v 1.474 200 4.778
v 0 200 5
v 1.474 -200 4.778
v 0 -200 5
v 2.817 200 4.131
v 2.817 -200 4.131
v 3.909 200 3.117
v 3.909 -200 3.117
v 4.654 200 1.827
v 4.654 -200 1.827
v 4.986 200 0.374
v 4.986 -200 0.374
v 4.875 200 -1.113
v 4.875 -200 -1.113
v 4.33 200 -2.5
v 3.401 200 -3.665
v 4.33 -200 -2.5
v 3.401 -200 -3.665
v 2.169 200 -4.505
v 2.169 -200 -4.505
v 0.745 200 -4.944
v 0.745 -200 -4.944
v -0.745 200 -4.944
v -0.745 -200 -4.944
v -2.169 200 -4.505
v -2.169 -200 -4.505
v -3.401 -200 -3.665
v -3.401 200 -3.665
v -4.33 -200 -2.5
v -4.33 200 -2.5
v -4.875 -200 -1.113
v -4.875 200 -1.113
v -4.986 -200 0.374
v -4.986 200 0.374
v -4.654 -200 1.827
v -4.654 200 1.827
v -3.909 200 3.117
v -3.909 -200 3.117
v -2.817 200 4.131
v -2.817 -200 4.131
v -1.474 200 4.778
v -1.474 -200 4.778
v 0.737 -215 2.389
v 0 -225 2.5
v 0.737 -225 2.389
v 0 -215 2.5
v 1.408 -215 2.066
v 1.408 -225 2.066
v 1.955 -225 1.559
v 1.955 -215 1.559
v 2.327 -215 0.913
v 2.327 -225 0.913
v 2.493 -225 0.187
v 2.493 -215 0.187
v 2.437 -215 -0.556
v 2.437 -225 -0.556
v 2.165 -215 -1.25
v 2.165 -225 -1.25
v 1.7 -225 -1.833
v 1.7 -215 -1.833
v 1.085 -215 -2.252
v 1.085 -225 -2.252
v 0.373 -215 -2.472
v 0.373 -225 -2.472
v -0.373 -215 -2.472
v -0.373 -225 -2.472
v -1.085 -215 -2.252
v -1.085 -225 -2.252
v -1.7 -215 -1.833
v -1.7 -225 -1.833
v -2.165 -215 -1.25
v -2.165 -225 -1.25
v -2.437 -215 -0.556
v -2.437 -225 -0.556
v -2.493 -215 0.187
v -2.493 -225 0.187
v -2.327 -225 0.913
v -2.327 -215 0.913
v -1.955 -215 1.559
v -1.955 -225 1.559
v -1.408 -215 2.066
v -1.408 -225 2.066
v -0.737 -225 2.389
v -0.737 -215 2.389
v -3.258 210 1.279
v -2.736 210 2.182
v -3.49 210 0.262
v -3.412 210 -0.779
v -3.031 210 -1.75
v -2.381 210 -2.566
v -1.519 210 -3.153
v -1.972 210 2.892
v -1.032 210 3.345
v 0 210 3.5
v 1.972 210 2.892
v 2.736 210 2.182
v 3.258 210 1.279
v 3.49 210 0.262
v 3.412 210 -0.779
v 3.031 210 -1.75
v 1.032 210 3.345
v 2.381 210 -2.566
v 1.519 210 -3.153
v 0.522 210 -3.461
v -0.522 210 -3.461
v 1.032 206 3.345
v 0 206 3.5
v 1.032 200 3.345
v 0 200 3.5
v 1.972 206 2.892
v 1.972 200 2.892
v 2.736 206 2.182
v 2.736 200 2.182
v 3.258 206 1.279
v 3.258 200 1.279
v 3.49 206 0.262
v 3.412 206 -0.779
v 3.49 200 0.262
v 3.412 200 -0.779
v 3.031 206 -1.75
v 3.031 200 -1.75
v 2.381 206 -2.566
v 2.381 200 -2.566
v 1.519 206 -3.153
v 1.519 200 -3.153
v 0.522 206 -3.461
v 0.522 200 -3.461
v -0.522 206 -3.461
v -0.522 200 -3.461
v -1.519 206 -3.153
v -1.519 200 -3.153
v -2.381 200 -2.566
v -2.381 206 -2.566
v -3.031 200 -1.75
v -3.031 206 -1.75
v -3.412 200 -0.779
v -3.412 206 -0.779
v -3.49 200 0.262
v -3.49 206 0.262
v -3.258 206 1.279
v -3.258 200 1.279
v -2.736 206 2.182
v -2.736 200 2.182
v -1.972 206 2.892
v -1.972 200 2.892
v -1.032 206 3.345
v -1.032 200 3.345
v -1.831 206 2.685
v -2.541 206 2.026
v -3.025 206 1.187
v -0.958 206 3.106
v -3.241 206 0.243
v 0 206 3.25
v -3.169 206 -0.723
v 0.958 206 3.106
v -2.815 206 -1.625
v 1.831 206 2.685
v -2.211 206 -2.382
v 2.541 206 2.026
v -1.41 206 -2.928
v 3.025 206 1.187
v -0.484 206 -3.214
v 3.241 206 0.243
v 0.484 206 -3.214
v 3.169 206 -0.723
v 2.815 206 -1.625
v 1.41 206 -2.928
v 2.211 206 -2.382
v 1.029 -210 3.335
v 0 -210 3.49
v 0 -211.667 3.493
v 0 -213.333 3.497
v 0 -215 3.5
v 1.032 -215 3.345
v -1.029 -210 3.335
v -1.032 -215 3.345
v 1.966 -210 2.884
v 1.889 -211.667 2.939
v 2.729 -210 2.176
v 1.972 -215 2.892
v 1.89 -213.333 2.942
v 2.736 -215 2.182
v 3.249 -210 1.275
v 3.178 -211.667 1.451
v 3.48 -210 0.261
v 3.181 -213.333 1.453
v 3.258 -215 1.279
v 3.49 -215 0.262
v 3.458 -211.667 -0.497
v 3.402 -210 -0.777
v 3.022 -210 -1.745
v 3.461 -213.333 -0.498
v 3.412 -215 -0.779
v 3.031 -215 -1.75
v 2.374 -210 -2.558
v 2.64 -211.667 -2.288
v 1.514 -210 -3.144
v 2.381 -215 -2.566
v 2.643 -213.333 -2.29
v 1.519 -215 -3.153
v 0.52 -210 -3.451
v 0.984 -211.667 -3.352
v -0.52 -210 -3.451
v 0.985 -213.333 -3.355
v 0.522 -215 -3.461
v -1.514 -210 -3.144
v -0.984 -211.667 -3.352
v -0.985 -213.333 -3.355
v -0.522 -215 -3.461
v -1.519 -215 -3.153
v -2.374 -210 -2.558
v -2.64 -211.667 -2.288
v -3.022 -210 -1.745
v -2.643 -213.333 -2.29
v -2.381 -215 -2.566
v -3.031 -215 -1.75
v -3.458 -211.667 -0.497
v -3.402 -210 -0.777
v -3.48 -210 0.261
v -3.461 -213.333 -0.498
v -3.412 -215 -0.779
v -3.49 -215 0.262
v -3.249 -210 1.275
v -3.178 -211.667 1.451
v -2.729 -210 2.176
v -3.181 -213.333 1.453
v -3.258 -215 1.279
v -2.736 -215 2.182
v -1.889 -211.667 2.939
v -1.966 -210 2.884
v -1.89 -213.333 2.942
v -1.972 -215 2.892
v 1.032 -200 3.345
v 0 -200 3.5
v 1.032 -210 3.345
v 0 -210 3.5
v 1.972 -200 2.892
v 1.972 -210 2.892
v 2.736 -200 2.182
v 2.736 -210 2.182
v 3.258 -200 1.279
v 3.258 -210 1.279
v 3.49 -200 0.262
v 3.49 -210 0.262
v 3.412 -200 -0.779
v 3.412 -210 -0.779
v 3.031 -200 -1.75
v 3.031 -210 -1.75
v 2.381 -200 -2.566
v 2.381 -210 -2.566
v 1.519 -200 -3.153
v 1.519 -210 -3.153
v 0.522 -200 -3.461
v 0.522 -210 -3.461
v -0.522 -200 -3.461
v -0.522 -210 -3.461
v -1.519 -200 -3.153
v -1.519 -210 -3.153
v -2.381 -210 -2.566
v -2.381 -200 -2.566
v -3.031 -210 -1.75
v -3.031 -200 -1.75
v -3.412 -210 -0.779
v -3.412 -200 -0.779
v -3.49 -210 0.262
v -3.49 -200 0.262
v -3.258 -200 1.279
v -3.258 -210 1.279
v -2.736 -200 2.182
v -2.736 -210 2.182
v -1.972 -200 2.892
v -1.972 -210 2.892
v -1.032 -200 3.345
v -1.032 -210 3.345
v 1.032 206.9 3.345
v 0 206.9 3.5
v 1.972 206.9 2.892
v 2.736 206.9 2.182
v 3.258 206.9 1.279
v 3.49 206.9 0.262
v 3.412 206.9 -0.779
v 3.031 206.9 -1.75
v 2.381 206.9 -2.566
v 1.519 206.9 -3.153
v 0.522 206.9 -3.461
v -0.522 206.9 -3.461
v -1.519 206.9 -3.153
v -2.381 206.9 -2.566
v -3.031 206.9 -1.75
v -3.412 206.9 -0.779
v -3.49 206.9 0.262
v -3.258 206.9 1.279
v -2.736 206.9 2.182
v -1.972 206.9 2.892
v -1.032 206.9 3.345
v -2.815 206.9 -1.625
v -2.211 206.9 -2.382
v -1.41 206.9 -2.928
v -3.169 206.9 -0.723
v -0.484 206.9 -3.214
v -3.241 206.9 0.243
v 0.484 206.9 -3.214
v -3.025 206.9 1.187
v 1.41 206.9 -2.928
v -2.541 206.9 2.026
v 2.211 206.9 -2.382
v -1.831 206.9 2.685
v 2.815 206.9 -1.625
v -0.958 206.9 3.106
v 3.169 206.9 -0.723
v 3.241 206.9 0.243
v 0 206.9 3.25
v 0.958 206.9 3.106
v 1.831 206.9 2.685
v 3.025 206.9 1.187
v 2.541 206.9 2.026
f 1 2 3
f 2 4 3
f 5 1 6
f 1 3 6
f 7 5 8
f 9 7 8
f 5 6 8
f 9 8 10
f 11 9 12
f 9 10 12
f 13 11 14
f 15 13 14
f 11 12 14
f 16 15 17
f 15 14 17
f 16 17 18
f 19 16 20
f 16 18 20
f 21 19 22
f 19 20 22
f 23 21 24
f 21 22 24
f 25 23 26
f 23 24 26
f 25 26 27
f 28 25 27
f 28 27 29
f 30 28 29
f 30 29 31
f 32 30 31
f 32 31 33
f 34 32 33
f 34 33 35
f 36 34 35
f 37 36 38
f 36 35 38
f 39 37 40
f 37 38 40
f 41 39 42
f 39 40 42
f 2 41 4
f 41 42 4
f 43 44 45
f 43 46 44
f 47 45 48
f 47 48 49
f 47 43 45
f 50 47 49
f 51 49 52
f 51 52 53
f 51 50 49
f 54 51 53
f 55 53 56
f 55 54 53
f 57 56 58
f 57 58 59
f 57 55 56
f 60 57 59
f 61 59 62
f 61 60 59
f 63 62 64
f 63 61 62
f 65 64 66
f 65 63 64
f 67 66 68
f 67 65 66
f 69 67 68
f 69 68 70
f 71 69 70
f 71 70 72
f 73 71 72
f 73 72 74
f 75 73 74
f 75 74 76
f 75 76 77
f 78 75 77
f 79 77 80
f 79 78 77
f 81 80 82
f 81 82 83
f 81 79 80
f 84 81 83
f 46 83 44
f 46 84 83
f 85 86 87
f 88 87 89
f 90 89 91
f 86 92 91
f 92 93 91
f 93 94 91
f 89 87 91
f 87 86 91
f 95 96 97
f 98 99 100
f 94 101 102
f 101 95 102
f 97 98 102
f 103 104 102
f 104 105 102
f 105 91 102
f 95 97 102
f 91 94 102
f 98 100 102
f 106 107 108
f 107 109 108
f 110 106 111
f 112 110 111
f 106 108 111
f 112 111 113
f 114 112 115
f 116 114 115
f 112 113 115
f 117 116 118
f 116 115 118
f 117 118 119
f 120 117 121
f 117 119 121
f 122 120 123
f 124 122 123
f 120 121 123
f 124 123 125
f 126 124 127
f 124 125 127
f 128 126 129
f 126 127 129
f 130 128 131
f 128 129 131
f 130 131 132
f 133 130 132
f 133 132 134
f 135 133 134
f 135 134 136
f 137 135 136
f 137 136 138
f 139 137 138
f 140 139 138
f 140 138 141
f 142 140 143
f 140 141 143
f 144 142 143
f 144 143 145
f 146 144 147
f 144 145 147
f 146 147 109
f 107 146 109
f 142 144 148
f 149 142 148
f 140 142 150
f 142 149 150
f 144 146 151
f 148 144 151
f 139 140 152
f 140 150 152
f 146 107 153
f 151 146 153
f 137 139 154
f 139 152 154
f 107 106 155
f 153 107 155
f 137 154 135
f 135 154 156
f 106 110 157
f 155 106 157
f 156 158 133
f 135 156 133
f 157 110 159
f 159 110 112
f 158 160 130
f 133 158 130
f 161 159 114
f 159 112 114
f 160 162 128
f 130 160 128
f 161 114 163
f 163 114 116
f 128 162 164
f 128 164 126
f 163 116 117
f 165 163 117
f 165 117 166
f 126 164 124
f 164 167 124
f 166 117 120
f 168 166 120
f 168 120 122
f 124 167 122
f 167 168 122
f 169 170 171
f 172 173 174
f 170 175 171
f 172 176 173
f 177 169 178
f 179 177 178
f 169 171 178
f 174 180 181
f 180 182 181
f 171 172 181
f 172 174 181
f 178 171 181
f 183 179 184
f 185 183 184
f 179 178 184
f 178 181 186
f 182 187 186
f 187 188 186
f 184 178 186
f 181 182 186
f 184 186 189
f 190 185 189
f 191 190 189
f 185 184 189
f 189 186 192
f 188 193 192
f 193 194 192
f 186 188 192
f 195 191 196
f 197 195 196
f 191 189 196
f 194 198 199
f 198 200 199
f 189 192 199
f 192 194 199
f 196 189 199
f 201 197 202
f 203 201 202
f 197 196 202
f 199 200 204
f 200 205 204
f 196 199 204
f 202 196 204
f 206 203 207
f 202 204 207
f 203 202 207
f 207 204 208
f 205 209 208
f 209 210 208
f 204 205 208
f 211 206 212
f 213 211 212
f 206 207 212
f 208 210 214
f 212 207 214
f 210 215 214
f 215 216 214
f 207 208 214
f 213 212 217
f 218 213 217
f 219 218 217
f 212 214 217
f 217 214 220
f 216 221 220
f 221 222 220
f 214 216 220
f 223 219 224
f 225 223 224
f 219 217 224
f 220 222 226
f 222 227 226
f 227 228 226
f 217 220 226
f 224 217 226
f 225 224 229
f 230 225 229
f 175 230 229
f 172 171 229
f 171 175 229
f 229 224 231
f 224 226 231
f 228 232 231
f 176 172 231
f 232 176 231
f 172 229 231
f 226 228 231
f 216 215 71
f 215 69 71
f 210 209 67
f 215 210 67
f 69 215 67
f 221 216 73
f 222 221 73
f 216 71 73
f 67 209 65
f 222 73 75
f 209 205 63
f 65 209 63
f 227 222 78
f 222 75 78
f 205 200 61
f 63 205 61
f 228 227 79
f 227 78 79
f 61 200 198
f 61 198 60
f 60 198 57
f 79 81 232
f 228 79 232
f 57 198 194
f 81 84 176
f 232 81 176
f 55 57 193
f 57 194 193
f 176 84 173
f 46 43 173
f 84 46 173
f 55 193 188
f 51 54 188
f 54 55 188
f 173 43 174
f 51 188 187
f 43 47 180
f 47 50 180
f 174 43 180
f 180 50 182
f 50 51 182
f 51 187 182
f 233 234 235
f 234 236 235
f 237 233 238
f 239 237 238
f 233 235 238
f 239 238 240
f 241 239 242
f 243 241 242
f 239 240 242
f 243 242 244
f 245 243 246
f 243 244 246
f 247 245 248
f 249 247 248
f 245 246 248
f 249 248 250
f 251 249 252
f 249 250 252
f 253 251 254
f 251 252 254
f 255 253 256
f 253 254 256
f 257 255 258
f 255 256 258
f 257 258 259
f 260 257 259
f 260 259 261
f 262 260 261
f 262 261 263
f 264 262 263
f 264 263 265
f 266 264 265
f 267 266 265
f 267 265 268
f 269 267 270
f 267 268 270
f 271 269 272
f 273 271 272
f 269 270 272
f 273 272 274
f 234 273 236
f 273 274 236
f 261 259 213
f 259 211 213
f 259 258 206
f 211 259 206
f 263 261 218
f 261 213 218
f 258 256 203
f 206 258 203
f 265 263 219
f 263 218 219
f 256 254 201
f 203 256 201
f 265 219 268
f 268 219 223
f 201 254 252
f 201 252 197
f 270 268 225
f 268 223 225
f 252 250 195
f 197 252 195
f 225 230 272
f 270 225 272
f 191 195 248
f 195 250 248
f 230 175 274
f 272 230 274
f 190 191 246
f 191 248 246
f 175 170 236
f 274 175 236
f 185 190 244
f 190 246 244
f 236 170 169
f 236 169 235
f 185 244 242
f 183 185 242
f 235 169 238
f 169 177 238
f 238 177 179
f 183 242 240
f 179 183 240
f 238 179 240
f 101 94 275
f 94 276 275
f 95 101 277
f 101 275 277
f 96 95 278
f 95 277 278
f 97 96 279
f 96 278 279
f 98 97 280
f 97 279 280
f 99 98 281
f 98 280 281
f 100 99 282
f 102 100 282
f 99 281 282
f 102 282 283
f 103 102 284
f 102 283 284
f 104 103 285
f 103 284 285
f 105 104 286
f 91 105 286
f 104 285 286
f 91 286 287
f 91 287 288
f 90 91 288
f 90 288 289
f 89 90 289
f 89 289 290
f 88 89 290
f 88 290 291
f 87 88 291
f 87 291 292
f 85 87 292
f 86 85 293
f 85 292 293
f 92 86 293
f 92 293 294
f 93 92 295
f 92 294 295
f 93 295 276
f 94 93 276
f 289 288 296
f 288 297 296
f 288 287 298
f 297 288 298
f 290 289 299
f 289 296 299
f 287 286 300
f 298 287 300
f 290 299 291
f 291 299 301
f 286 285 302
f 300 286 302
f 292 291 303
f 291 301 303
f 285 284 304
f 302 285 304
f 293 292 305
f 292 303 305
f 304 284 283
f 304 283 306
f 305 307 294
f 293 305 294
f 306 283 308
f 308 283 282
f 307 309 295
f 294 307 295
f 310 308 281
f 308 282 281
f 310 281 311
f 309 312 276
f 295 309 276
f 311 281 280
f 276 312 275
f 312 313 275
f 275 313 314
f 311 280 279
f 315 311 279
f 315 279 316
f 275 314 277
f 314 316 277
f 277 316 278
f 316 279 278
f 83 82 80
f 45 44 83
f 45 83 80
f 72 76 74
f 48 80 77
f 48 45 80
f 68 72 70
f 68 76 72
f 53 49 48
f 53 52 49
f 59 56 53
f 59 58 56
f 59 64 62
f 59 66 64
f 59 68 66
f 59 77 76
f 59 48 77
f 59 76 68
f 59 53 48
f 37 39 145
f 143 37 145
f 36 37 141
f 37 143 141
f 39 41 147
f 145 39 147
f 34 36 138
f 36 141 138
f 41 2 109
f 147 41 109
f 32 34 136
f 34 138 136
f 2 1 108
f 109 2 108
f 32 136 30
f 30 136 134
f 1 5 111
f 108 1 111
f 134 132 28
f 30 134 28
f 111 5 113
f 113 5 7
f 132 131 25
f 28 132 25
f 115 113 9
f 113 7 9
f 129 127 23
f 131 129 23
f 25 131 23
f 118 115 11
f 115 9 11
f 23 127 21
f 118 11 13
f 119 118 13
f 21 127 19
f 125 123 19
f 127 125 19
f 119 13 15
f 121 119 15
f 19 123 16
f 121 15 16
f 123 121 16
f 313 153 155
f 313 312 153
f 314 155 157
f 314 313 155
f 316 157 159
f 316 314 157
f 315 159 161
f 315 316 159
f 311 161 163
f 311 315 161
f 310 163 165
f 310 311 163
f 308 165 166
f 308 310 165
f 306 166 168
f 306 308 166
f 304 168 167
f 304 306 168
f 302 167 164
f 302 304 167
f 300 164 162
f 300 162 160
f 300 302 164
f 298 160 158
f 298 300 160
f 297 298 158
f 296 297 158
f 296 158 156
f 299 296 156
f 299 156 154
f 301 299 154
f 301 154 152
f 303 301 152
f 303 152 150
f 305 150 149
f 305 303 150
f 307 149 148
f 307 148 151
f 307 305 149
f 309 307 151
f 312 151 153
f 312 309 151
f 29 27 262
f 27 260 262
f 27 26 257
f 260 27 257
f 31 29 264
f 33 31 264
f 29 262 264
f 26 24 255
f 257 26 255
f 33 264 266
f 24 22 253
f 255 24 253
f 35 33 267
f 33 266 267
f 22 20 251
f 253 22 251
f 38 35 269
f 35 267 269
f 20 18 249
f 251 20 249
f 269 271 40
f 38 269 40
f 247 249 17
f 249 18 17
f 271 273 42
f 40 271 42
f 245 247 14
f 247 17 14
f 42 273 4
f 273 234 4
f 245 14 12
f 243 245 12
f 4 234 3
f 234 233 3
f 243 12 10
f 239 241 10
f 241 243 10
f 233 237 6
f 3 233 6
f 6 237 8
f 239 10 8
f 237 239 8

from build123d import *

# Parameters (mm, degrees)
F0_W   = 10
F0_H   = 2.5
F0_W_2 = 0.9
F0_H_2 = 3.25


# Not quite as in the source:
# - a feature names something its author has since deleted; it is built from what else it names


with BuildPart() as f1:
    # F0 (on Right) → F1 (revolve)
    with BuildSketch(Plane.YZ):
        Polygon((200, 3.5), (200, 5), (-200, 5), (-200, 3.5), (-200, 0), (200, 0), align=None)
        Polygon((-200, 0), (-200, 3.5), (-210, 3.5), (-210, 3.48999998), (-210, 0), align=None)
        with Locations((-220, 1.25)):
            Rectangle(F0_W, F0_H)
        Polygon((206, 3.5), (200, 3.5), (200, 0), (206, 0), (206, 3.25), align=None)
        with Locations((206.45, 1.625)):
            Rectangle(F0_W_2, F0_H_2)
        Polygon((206.9, 3.25), (206.9, 0), (210, 0), (210, 3.5), (206.9, 3.5), align=None)
        Polygon((-215, 0), (-210, 0), (-210, 3.48999998), (-215, 3.5), (-215, 2.5), align=None)
    revolve(axis=Axis((0, -7.5, 0), (0, 1, 0)))


solid = f1.part
